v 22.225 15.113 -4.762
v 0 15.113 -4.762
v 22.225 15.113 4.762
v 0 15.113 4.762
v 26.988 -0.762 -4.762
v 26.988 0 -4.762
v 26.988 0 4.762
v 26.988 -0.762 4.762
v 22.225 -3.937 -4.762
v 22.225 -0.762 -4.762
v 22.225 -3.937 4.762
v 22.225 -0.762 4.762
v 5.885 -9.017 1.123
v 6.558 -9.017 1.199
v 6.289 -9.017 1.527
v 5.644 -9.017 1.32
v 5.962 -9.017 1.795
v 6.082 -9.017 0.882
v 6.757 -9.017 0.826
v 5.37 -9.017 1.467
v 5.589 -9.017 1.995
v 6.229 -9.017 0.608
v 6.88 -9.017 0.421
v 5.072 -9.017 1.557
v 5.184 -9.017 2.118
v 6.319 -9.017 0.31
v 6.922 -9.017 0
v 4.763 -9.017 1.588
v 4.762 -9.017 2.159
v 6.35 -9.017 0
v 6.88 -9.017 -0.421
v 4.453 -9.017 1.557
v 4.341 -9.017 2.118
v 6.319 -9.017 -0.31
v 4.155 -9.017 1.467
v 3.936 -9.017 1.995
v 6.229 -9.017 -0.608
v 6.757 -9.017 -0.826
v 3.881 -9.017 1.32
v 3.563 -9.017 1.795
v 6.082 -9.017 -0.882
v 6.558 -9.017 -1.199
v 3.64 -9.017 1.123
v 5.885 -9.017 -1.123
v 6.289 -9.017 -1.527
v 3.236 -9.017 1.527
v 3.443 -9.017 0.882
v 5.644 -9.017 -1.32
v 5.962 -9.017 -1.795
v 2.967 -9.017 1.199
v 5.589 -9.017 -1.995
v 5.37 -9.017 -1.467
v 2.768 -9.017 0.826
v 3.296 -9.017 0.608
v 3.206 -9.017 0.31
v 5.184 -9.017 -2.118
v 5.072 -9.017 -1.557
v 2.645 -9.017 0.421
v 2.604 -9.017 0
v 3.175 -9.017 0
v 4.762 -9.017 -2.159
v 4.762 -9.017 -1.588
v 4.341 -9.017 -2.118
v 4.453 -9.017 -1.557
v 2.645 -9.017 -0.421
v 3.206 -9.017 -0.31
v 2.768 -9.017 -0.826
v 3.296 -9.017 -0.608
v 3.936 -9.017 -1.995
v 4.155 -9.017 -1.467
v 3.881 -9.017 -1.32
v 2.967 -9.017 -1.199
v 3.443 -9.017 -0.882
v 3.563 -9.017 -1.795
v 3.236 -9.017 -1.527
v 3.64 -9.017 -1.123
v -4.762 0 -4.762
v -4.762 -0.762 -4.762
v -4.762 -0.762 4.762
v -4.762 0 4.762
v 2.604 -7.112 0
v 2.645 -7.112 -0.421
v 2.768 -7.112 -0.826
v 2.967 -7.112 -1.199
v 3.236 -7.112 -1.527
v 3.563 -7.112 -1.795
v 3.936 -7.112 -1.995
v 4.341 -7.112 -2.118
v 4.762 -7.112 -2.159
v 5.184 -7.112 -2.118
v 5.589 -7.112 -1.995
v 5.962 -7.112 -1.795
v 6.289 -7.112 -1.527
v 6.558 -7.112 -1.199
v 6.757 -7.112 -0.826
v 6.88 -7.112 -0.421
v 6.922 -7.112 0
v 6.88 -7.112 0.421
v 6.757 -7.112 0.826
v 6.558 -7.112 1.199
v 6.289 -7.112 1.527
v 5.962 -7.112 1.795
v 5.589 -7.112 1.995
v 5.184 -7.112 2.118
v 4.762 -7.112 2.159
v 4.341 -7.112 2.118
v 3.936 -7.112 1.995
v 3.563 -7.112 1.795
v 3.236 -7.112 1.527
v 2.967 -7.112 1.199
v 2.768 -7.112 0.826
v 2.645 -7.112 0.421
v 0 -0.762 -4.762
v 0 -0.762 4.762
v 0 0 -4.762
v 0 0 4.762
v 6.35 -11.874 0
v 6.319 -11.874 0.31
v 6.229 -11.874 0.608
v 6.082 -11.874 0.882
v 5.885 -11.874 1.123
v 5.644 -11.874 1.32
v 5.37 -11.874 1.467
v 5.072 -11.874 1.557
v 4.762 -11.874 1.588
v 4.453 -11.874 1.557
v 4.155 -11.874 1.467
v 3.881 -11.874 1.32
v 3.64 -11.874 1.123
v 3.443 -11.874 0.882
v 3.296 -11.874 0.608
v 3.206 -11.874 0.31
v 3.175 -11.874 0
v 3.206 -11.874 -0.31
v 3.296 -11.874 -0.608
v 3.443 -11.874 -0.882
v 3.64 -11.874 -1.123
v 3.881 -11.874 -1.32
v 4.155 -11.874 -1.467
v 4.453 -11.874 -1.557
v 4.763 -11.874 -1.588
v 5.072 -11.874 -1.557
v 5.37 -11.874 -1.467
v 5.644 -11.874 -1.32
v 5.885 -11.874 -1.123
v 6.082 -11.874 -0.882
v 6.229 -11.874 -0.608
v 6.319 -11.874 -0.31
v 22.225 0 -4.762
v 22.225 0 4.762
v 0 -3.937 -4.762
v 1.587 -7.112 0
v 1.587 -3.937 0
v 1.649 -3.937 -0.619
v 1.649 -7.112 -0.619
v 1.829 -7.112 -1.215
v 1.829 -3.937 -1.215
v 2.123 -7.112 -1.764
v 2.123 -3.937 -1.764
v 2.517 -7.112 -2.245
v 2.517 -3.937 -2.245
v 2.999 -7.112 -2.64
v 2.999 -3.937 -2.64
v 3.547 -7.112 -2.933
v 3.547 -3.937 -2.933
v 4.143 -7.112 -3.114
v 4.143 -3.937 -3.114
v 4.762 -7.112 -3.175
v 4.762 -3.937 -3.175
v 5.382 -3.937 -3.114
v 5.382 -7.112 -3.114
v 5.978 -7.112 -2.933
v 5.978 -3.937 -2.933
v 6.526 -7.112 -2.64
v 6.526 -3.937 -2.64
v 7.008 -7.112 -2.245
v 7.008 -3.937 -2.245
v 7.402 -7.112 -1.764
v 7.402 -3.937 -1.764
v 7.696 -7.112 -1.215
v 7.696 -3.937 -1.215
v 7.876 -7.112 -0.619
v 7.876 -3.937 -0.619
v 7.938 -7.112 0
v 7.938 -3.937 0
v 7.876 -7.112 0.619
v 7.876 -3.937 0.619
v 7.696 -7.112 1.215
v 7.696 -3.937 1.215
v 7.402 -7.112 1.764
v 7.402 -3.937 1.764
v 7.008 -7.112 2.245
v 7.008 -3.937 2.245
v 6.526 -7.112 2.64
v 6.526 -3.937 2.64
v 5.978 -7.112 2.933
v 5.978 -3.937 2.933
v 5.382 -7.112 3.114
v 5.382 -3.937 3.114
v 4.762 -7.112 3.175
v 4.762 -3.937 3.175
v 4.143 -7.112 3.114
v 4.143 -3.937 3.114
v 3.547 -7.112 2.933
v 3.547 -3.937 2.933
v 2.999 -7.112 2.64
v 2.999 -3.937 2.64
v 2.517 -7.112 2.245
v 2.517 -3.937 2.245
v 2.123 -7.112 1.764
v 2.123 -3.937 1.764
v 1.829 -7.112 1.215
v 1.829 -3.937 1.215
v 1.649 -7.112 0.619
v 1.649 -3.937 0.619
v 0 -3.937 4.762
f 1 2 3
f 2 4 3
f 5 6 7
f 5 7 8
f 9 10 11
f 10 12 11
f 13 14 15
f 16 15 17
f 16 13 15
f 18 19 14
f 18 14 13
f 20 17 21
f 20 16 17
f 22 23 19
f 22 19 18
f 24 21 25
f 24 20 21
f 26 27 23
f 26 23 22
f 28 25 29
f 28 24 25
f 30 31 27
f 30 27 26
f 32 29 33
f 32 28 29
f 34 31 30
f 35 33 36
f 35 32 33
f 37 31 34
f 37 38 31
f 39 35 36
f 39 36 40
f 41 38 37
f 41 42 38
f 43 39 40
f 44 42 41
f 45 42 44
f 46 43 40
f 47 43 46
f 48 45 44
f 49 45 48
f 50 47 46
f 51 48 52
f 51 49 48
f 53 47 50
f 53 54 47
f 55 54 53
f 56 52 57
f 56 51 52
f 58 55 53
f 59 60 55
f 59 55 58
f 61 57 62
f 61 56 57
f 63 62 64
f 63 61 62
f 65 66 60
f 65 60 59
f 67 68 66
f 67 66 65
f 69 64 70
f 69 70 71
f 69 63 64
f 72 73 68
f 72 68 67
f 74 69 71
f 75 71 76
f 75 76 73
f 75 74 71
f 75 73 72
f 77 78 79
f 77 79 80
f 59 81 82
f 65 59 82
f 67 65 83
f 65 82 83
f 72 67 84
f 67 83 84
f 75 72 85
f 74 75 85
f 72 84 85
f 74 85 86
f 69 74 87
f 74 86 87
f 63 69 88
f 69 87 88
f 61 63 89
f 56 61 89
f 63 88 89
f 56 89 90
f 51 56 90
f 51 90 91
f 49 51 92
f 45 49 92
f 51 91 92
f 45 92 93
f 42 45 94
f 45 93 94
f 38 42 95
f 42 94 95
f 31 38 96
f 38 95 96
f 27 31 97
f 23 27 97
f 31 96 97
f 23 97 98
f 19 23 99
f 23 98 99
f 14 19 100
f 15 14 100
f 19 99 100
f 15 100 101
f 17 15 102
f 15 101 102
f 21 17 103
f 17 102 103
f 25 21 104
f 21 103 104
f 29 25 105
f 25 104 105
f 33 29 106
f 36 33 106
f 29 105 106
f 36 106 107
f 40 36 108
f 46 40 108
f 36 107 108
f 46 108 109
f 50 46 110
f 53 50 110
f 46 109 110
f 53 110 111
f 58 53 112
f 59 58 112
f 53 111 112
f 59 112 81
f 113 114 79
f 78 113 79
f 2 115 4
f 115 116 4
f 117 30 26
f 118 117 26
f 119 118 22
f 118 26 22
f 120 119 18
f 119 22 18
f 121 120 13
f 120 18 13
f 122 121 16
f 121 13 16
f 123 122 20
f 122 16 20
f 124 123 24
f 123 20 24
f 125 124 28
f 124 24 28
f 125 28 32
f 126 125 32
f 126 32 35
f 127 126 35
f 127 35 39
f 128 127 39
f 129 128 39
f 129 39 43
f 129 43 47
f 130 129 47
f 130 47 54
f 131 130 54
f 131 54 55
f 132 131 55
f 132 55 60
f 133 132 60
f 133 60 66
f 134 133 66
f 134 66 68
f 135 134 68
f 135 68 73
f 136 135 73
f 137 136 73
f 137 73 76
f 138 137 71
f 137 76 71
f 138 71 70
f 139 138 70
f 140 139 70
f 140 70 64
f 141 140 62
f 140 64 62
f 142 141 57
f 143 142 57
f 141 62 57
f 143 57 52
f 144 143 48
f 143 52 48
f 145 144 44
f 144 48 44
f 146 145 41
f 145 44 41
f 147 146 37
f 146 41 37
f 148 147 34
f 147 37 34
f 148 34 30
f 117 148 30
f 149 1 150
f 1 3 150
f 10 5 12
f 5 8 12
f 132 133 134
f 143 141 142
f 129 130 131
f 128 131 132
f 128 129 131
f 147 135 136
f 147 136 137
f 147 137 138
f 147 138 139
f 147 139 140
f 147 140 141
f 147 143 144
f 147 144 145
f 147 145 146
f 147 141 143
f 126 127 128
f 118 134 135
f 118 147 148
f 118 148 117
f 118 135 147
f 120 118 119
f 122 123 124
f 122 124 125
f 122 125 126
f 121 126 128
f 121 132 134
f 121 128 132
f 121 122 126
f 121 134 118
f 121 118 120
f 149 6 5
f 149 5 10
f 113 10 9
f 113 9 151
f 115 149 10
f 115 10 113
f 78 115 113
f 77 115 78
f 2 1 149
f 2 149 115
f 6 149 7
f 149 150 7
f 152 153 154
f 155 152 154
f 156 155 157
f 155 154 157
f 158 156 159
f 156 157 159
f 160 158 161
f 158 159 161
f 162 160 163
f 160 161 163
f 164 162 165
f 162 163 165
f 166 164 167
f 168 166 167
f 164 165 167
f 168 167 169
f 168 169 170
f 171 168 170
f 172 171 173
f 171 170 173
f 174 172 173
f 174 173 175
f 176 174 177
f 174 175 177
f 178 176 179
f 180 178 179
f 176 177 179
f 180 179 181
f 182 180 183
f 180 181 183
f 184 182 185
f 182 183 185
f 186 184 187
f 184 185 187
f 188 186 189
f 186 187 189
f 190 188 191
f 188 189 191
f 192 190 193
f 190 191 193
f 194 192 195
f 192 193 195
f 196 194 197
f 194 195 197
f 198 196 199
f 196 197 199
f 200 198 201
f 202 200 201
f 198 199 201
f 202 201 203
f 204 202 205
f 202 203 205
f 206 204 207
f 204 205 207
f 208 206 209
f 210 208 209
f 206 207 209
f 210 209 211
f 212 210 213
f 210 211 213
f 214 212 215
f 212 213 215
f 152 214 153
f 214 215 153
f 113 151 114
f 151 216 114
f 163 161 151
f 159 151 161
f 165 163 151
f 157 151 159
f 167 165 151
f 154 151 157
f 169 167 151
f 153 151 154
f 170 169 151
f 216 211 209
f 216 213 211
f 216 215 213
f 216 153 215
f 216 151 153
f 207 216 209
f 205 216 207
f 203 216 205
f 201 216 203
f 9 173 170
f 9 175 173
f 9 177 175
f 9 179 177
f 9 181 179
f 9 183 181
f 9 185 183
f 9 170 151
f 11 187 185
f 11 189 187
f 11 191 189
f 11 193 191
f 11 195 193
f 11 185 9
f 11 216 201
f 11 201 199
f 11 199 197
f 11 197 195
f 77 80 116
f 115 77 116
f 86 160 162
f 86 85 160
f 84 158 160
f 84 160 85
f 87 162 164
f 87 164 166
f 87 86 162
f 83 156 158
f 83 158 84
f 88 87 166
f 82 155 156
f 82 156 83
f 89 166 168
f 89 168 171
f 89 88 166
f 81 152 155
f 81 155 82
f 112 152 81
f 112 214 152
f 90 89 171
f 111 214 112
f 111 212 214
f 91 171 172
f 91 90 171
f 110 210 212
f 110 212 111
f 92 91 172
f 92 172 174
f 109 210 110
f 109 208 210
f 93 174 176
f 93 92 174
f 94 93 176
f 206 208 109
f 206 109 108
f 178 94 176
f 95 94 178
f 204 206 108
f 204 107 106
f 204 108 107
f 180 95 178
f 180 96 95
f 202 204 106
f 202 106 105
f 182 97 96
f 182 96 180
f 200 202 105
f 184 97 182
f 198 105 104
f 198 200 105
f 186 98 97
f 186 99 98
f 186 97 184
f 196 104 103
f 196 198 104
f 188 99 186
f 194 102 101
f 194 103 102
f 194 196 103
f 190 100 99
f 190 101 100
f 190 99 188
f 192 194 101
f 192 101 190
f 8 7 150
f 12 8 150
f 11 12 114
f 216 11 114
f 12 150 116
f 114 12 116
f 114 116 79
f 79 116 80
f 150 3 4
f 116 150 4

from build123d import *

# Parameters (mm, degrees)
BOSS_EXTRUDE1_DEPTH = 4.7625
SKETCH2_R           = 3.175
SKETCH2_R_2         = 1.5875
BOSS_EXTRUDE3_DEPTH = 3.175
SKETCH2_4_R         = 1.5875
BOSS_EXTRUDE4_DEPTH = 7.9375
SKETCH4_R           = 2.159
BOSS_EXTRUDE5_DEPTH = 1.905


with BuildPart() as part:
    # Sketch1 → Boss-Extrude1 (new, symmetric)
    with BuildSketch(Plane.XY):
        Polygon((0, 15.113), (0, 0), (-4.7625, 0), (-4.7625, -0.762), (0, -0.762), (0, -3.937), (1.5875, -3.937), (7.9375, -3.937), (22.225, -3.937), (22.225, -0.762), (26.9875, -0.762), (26.9875, 0), (22.225, 0), (22.225, 15.113), align=None)
    extrude(amount=BOSS_EXTRUDE1_DEPTH, both=True)

    # Sketch2 → Boss-Extrude3 (add)
    with BuildSketch(Plane.XZ.offset(3.937)):
        with Locations((4.7625, 0)):
            Circle(SKETCH2_R)
        with Locations((4.7625, 0)):
            Circle(SKETCH2_R_2, mode=Mode.SUBTRACT)
    extrude(amount=BOSS_EXTRUDE3_DEPTH)

    # Sketch2<4> → Boss-Extrude4 (add)
    with BuildSketch(Plane.XZ.offset(3.937)):
        with Locations((4.7625, 0)):
            Circle(SKETCH2_4_R)
    extrude(amount=BOSS_EXTRUDE4_DEPTH)

    # Sketch4 → Boss-Extrude5 (add)
    with BuildSketch(Plane.XZ.offset(7.112)):
        with Locations((4.7625, 0)):
            Circle(SKETCH4_R)
    extrude(amount=BOSS_EXTRUDE5_DEPTH)


solid = part.part
